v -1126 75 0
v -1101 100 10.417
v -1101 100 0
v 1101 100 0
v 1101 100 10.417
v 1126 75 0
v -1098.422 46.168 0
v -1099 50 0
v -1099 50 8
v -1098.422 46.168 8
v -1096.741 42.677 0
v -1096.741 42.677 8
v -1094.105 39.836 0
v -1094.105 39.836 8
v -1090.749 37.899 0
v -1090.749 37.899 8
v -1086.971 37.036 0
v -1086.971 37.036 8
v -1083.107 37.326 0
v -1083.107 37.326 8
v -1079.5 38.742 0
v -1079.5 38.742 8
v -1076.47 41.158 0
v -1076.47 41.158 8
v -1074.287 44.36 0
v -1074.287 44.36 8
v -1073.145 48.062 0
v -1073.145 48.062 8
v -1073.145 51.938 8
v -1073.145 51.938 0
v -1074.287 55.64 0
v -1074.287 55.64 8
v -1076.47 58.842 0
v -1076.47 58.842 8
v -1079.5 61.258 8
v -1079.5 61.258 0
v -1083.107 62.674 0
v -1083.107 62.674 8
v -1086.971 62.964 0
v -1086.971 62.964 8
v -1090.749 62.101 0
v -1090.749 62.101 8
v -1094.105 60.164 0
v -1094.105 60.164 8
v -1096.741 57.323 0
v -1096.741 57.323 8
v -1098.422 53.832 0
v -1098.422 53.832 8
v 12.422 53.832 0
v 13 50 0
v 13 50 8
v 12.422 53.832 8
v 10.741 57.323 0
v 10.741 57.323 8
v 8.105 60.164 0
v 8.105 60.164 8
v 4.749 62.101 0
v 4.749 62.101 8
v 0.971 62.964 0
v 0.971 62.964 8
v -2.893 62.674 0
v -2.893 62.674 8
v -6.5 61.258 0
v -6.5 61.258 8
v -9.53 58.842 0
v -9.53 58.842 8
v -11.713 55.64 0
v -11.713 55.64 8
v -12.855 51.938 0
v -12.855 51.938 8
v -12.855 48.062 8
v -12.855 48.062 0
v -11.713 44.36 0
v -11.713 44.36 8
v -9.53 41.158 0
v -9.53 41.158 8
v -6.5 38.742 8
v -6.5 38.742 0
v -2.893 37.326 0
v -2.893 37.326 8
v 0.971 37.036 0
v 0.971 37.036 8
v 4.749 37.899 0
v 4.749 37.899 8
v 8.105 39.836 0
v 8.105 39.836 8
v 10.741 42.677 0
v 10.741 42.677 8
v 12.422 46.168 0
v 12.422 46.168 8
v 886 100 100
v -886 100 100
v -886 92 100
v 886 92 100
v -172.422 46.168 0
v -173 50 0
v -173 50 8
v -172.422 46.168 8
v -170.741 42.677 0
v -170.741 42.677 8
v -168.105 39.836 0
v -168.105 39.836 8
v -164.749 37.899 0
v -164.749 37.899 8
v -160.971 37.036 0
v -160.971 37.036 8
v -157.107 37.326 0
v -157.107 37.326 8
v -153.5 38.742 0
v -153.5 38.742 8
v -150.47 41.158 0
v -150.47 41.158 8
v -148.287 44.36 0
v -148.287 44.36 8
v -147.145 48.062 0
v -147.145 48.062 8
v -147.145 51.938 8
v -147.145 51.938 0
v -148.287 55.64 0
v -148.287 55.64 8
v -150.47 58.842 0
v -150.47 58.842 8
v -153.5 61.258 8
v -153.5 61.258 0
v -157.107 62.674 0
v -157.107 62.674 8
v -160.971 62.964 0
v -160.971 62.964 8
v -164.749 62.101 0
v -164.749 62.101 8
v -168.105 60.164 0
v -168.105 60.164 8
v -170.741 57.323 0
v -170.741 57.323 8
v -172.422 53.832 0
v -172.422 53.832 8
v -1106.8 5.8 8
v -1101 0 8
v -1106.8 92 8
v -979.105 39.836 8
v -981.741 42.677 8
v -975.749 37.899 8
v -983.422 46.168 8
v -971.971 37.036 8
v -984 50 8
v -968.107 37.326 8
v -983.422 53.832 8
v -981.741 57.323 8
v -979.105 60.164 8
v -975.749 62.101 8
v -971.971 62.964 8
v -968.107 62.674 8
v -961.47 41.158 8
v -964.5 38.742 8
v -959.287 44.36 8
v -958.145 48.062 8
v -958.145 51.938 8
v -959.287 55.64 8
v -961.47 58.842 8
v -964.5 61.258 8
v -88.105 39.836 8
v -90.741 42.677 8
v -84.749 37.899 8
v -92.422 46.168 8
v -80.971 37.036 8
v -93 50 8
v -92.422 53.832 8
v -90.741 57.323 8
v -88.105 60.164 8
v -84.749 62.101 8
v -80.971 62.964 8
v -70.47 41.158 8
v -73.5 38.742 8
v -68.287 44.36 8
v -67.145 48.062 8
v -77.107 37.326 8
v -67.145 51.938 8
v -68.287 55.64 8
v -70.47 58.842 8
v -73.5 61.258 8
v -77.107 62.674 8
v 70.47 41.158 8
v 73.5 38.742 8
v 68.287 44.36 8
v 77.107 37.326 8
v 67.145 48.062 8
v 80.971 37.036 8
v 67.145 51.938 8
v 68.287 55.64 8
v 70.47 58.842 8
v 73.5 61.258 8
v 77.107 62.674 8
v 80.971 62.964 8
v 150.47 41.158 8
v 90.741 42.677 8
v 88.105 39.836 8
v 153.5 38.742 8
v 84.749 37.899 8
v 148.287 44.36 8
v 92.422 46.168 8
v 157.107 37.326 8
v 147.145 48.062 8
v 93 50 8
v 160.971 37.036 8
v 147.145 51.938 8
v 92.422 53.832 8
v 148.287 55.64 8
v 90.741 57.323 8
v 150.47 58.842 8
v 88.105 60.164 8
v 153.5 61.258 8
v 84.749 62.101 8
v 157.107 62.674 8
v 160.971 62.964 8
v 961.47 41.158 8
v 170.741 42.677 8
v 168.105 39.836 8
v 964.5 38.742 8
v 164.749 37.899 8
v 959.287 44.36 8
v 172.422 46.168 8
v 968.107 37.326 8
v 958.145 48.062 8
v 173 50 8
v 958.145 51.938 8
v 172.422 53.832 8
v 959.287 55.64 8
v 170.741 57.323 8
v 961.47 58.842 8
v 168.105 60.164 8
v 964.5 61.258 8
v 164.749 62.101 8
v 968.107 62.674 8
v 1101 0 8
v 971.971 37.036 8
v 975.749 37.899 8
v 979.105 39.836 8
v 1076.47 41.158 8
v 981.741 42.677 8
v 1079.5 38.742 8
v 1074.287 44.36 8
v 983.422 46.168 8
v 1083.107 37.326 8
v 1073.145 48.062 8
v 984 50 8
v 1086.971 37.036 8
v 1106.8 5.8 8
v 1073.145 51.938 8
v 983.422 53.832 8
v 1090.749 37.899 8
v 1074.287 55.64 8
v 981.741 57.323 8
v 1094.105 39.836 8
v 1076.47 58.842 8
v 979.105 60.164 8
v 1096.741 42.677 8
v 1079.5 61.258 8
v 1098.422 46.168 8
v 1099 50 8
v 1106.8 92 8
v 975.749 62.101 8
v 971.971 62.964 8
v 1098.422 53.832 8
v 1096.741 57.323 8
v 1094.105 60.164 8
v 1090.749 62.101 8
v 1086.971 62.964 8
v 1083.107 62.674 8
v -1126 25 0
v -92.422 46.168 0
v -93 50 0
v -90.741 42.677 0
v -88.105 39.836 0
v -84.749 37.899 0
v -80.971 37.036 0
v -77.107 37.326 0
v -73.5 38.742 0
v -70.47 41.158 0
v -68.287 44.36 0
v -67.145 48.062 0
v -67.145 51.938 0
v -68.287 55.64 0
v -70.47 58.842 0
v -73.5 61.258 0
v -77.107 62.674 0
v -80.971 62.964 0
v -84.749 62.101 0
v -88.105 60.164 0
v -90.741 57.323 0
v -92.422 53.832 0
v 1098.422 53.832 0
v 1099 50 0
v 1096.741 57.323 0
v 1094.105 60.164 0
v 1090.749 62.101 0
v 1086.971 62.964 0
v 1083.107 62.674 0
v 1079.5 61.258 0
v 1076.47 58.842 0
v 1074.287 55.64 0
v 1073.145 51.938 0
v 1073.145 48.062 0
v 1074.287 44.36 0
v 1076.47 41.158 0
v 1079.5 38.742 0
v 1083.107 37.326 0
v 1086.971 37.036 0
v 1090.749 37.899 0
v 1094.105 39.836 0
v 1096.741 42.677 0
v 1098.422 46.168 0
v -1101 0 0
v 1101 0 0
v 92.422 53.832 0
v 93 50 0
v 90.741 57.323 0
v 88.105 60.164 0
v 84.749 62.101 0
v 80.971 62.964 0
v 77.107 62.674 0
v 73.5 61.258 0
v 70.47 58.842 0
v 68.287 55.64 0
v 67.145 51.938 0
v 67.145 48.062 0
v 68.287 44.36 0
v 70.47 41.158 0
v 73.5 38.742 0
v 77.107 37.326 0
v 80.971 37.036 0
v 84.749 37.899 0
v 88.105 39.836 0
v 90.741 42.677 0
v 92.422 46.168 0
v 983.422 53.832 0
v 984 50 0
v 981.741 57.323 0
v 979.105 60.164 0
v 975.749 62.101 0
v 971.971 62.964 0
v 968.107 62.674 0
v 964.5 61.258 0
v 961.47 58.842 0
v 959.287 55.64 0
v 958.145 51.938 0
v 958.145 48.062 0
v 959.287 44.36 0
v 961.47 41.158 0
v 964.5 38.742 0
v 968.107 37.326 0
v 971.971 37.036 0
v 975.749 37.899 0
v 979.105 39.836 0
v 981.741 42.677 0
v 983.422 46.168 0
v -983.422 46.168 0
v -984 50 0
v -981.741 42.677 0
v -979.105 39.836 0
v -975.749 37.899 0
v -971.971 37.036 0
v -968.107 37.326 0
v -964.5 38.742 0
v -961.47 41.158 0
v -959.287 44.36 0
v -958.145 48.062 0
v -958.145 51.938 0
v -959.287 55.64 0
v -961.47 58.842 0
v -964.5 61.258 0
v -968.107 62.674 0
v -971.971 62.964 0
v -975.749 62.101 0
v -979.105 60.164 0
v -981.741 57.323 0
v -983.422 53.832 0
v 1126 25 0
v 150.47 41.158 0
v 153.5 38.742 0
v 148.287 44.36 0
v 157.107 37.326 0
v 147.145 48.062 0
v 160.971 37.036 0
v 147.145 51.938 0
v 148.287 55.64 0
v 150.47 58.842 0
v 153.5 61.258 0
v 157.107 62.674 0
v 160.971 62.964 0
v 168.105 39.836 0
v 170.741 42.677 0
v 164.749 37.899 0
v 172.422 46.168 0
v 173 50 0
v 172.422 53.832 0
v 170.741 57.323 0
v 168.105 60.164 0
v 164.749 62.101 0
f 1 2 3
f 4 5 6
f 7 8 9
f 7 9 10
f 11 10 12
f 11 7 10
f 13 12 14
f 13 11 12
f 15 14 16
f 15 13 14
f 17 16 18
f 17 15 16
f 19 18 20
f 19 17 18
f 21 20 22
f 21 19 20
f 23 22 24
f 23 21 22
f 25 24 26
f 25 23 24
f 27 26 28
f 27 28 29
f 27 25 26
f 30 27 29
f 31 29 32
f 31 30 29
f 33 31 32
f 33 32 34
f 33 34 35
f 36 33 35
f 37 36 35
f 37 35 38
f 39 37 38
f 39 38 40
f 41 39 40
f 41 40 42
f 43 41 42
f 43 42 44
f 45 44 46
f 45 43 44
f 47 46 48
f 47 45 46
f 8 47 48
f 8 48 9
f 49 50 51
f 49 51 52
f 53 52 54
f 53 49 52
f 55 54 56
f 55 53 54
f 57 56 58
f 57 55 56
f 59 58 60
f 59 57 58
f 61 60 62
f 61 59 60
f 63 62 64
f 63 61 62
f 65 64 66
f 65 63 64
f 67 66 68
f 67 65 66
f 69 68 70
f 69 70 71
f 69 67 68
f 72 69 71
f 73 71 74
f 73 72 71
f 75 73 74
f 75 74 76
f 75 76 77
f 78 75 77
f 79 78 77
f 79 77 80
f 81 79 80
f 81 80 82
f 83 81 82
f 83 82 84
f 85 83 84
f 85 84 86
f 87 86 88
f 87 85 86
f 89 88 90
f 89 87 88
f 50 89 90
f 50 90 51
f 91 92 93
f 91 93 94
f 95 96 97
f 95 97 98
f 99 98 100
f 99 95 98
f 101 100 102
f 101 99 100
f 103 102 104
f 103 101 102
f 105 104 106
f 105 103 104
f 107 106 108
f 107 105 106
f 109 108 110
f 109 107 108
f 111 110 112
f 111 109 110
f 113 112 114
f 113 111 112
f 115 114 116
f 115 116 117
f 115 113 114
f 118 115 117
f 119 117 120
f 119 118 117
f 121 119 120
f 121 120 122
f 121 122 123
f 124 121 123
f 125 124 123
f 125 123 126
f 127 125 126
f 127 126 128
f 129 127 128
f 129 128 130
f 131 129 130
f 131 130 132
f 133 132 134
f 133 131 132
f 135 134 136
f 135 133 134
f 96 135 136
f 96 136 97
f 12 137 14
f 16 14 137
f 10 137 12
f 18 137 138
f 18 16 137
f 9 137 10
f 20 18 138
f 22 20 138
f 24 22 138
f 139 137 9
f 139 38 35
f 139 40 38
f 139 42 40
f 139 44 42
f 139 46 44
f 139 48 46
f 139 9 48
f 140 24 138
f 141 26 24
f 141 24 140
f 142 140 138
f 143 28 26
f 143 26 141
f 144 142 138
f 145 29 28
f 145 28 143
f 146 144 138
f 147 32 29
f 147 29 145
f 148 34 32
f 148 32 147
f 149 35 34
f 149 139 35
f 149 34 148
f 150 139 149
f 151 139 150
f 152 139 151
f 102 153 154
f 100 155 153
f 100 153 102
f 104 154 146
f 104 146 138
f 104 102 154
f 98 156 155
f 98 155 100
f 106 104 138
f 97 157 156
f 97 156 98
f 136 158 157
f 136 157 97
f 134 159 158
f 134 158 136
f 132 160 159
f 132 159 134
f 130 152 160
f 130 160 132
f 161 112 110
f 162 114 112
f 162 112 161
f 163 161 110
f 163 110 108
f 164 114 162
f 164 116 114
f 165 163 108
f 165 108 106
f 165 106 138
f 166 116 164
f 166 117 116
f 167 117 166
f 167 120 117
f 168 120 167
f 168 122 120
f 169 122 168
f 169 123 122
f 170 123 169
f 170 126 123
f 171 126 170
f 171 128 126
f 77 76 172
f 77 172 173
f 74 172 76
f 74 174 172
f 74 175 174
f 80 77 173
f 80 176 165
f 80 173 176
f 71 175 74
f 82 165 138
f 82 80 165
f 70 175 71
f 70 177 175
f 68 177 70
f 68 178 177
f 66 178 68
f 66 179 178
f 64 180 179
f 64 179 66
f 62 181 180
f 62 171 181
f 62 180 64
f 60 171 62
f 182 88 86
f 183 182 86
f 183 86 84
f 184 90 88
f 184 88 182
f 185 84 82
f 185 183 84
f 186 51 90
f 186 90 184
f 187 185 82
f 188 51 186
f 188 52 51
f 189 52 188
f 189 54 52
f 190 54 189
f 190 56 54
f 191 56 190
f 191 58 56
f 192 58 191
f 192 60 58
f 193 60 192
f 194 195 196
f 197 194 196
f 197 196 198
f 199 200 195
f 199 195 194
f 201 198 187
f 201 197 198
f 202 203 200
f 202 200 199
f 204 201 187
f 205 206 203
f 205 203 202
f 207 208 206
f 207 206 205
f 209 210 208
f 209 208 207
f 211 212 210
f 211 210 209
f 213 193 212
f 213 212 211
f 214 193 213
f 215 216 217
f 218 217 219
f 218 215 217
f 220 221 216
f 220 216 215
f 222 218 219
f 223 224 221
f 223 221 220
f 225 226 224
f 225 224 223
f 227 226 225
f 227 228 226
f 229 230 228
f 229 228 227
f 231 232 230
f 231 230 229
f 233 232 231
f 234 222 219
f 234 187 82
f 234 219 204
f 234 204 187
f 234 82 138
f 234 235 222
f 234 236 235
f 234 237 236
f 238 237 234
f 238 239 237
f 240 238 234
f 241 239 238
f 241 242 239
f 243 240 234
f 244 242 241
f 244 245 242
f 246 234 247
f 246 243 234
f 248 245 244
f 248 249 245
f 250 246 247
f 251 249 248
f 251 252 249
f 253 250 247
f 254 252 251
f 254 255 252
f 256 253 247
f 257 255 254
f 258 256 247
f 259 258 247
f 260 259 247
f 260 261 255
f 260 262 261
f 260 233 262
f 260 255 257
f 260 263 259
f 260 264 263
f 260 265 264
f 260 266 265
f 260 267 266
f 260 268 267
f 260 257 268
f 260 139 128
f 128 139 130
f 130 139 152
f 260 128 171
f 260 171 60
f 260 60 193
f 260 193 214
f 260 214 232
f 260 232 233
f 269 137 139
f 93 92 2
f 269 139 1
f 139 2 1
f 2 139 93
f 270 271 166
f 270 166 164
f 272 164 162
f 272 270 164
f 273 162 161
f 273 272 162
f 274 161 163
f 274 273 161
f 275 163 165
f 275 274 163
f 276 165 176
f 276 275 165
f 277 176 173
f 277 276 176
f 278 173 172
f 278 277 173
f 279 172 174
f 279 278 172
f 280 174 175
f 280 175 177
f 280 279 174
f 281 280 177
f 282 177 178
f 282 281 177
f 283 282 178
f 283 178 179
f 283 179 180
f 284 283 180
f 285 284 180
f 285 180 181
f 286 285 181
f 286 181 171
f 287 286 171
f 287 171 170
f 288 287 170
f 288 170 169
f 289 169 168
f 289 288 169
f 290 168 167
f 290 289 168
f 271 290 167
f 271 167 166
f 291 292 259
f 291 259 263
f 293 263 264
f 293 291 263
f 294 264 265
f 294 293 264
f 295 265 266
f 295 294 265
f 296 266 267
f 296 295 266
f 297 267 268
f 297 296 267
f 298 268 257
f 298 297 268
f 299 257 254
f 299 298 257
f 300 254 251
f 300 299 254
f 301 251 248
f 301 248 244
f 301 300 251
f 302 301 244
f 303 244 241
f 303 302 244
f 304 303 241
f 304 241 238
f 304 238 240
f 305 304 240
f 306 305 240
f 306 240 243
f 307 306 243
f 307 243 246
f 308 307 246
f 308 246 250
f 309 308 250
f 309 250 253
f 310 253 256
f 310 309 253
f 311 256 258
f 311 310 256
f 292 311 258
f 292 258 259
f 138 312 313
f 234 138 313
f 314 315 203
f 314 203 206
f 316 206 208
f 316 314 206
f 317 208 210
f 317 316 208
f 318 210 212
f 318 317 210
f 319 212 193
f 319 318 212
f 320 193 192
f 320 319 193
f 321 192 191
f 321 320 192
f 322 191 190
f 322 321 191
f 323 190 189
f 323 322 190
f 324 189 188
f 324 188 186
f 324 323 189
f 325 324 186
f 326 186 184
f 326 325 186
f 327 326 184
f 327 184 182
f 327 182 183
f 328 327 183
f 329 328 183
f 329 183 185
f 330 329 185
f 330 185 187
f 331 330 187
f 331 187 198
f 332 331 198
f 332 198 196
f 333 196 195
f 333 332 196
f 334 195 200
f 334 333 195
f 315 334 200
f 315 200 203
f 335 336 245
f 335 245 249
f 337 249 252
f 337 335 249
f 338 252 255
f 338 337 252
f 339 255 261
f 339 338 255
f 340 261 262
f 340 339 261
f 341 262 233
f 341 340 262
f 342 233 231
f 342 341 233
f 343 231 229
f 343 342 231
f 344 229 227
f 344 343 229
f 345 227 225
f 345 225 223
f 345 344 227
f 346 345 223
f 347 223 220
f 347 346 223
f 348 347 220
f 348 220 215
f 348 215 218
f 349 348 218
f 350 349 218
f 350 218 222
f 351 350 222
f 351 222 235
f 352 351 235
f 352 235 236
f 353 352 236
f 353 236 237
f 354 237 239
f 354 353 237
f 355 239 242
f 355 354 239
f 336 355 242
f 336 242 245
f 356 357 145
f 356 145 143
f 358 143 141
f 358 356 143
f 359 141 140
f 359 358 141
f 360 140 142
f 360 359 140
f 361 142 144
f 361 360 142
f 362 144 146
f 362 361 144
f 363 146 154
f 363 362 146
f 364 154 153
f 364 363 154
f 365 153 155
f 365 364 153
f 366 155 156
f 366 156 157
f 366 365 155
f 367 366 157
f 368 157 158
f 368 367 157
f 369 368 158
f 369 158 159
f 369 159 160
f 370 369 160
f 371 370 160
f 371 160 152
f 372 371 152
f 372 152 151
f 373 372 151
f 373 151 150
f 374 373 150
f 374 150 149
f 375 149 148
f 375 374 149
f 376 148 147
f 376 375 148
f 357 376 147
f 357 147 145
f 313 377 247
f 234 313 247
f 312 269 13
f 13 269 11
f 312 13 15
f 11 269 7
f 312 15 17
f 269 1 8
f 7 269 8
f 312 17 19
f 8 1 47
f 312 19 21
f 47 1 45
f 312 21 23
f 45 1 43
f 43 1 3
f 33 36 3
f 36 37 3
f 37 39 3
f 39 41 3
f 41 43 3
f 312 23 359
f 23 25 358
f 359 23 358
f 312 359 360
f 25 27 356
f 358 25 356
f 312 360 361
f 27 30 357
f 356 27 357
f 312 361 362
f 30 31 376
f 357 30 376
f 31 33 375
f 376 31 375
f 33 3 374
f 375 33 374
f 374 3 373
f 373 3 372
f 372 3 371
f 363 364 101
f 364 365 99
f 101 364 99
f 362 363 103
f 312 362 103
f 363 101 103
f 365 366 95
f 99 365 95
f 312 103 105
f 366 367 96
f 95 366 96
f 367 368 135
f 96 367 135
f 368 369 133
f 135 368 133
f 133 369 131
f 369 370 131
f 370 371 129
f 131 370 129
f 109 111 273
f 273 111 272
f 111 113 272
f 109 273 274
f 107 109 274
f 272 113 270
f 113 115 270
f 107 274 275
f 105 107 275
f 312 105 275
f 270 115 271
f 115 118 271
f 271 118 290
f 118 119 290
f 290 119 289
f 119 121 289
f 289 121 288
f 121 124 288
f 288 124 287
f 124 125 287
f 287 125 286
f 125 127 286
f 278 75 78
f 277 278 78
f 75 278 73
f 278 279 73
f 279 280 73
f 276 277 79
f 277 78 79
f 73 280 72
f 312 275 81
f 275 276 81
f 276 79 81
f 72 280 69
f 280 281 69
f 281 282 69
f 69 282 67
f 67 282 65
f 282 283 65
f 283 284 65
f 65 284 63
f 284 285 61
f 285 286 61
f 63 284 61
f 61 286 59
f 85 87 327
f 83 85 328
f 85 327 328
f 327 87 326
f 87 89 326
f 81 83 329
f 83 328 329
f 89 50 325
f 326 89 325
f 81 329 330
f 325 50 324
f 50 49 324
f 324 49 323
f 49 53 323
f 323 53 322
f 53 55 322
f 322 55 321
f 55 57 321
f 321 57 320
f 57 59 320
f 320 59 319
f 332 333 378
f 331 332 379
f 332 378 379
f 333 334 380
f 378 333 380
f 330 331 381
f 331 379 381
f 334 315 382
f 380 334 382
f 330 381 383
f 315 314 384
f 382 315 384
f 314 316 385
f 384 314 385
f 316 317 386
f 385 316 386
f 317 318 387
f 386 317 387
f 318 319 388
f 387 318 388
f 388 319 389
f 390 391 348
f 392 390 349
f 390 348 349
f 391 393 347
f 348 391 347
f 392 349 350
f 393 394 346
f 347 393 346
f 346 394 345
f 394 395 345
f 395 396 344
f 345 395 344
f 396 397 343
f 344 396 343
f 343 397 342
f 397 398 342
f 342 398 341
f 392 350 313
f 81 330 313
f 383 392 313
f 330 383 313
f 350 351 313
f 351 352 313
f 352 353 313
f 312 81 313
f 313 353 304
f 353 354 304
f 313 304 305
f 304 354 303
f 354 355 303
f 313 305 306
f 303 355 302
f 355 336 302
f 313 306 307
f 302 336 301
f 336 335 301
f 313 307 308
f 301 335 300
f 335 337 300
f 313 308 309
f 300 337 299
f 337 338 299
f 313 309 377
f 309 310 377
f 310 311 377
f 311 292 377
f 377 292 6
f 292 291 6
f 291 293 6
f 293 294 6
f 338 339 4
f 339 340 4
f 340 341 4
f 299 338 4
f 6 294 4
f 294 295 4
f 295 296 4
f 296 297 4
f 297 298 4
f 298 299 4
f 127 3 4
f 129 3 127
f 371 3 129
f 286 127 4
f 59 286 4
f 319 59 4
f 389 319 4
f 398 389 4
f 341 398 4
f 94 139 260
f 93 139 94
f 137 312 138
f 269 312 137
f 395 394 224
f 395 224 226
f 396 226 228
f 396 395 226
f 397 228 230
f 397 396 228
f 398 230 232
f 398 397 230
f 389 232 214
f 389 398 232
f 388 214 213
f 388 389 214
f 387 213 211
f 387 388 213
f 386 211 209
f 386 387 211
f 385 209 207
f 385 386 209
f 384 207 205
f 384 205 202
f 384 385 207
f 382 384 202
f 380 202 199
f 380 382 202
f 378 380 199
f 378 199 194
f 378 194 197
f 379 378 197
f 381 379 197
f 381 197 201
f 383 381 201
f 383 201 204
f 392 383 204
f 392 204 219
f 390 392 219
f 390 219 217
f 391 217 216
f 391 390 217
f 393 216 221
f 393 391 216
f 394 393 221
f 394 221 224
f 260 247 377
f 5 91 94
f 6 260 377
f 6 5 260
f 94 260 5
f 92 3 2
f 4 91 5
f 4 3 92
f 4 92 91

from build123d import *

# Parameters (mm, degrees)
SKETCH_1_W          = 2252
SKETCH_1_H          = 100
SKETCH_1_R          = 13
EXTRUDE_1_DEPTH     = 8
SKETCH_2_W          = 2252
SKETCH_2_H          = 8
EXTRUDE_2_DEPTH     = 92
CHAMFER_3_SIZE      = 25
CHAMFER_4_SIZE      = 25
CUT_EXTRUDE_3_DEPTH = 1135.846245092
CHAMFER_5_SIZE      = 25
CHAMFER_6_SIZE      = 25


with BuildPart() as part:
    # 草图1 → 凸台-拉伸1 (new body)
    with BuildSketch(Plane.XY):
        with Locations((0, 50)):
            Rectangle(SKETCH_1_W, SKETCH_1_H)
        with Locations((1086, 50)):
            Circle(SKETCH_1_R, mode=Mode.SUBTRACT)
        with Locations((971, 50)):
            Circle(SKETCH_1_R, mode=Mode.SUBTRACT)
        with Locations((0, 50)):
            Circle(SKETCH_1_R, mode=Mode.SUBTRACT)
        with Locations((80, 50)):
            Circle(SKETCH_1_R, mode=Mode.SUBTRACT)
        with Locations((160, 50)):
            Circle(SKETCH_1_R, mode=Mode.SUBTRACT)
        with Locations(Location((-80, 50, 0), (0, 0, 180))):
            Circle(SKETCH_1_R, mode=Mode.SUBTRACT)
        with Locations(Location((-160, 50, 0), (0, 0, 180))):
            Circle(SKETCH_1_R, mode=Mode.SUBTRACT)
        with Locations(Location((-971, 50, 0), (0, 0, 180))):
            Circle(SKETCH_1_R, mode=Mode.SUBTRACT)
        with Locations(Location((-1086, 50, 0), (0, 0, 180))):
            Circle(SKETCH_1_R, mode=Mode.SUBTRACT)
    extrude(amount=EXTRUDE_1_DEPTH)

    # 草图2 → 凸台-拉伸2 (add)
    with BuildSketch(Plane.XY.offset(8)):
        with Locations((0, 96)):
            Rectangle(SKETCH_2_W, SKETCH_2_H)
    extrude(amount=EXTRUDE_2_DEPTH)

    # 倒角3
    chamfer_3_edges = [part.edges().sort_by_distance(p)[0] for p in [
        (1126, 0, 4),
    ]]
    chamfer(chamfer_3_edges, length=CHAMFER_3_SIZE)

    # 倒角4
    chamfer_4_edges = [part.edges().sort_by_distance(p)[0] for p in [
        (1126, 100, 50),
    ]]
    chamfer(chamfer_4_edges, length=CHAMFER_4_SIZE)

    # 草图3 → 切除-拉伸3 (cut, through all)
    with BuildSketch(Plane(origin=(0, 100, 0), x_dir=(1, 0, 0), z_dir=(0, 1, 0))):
        Polygon((886, -100), (1126, 0), (1126, -100), align=None)
    cut_extrude_3 = extrude(amount=-CUT_EXTRUDE_3_DEPTH, mode=Mode.SUBTRACT)

    # 倒角5
    chamfer_5_edges = [part.edges().sort_by_distance(p)[0] for p in [
        (-1126, 0, 4),
    ]]
    chamfer(chamfer_5_edges, length=CHAMFER_5_SIZE)

    # 倒角6
    chamfer_6_edges = [part.edges().sort_by_distance(p)[0] for p in [
        (-1126, 100, 50),
    ]]
    chamfer(chamfer_6_edges, length=CHAMFER_6_SIZE)

    # 镜向8: 切除-拉伸3 across plane
    add(cut_extrude_3.mirror(Plane(origin=(0, 0, 0), x_dir=(0, 0, 1), z_dir=(1, 0, 0))), mode=Mode.SUBTRACT)


solid = part.part
